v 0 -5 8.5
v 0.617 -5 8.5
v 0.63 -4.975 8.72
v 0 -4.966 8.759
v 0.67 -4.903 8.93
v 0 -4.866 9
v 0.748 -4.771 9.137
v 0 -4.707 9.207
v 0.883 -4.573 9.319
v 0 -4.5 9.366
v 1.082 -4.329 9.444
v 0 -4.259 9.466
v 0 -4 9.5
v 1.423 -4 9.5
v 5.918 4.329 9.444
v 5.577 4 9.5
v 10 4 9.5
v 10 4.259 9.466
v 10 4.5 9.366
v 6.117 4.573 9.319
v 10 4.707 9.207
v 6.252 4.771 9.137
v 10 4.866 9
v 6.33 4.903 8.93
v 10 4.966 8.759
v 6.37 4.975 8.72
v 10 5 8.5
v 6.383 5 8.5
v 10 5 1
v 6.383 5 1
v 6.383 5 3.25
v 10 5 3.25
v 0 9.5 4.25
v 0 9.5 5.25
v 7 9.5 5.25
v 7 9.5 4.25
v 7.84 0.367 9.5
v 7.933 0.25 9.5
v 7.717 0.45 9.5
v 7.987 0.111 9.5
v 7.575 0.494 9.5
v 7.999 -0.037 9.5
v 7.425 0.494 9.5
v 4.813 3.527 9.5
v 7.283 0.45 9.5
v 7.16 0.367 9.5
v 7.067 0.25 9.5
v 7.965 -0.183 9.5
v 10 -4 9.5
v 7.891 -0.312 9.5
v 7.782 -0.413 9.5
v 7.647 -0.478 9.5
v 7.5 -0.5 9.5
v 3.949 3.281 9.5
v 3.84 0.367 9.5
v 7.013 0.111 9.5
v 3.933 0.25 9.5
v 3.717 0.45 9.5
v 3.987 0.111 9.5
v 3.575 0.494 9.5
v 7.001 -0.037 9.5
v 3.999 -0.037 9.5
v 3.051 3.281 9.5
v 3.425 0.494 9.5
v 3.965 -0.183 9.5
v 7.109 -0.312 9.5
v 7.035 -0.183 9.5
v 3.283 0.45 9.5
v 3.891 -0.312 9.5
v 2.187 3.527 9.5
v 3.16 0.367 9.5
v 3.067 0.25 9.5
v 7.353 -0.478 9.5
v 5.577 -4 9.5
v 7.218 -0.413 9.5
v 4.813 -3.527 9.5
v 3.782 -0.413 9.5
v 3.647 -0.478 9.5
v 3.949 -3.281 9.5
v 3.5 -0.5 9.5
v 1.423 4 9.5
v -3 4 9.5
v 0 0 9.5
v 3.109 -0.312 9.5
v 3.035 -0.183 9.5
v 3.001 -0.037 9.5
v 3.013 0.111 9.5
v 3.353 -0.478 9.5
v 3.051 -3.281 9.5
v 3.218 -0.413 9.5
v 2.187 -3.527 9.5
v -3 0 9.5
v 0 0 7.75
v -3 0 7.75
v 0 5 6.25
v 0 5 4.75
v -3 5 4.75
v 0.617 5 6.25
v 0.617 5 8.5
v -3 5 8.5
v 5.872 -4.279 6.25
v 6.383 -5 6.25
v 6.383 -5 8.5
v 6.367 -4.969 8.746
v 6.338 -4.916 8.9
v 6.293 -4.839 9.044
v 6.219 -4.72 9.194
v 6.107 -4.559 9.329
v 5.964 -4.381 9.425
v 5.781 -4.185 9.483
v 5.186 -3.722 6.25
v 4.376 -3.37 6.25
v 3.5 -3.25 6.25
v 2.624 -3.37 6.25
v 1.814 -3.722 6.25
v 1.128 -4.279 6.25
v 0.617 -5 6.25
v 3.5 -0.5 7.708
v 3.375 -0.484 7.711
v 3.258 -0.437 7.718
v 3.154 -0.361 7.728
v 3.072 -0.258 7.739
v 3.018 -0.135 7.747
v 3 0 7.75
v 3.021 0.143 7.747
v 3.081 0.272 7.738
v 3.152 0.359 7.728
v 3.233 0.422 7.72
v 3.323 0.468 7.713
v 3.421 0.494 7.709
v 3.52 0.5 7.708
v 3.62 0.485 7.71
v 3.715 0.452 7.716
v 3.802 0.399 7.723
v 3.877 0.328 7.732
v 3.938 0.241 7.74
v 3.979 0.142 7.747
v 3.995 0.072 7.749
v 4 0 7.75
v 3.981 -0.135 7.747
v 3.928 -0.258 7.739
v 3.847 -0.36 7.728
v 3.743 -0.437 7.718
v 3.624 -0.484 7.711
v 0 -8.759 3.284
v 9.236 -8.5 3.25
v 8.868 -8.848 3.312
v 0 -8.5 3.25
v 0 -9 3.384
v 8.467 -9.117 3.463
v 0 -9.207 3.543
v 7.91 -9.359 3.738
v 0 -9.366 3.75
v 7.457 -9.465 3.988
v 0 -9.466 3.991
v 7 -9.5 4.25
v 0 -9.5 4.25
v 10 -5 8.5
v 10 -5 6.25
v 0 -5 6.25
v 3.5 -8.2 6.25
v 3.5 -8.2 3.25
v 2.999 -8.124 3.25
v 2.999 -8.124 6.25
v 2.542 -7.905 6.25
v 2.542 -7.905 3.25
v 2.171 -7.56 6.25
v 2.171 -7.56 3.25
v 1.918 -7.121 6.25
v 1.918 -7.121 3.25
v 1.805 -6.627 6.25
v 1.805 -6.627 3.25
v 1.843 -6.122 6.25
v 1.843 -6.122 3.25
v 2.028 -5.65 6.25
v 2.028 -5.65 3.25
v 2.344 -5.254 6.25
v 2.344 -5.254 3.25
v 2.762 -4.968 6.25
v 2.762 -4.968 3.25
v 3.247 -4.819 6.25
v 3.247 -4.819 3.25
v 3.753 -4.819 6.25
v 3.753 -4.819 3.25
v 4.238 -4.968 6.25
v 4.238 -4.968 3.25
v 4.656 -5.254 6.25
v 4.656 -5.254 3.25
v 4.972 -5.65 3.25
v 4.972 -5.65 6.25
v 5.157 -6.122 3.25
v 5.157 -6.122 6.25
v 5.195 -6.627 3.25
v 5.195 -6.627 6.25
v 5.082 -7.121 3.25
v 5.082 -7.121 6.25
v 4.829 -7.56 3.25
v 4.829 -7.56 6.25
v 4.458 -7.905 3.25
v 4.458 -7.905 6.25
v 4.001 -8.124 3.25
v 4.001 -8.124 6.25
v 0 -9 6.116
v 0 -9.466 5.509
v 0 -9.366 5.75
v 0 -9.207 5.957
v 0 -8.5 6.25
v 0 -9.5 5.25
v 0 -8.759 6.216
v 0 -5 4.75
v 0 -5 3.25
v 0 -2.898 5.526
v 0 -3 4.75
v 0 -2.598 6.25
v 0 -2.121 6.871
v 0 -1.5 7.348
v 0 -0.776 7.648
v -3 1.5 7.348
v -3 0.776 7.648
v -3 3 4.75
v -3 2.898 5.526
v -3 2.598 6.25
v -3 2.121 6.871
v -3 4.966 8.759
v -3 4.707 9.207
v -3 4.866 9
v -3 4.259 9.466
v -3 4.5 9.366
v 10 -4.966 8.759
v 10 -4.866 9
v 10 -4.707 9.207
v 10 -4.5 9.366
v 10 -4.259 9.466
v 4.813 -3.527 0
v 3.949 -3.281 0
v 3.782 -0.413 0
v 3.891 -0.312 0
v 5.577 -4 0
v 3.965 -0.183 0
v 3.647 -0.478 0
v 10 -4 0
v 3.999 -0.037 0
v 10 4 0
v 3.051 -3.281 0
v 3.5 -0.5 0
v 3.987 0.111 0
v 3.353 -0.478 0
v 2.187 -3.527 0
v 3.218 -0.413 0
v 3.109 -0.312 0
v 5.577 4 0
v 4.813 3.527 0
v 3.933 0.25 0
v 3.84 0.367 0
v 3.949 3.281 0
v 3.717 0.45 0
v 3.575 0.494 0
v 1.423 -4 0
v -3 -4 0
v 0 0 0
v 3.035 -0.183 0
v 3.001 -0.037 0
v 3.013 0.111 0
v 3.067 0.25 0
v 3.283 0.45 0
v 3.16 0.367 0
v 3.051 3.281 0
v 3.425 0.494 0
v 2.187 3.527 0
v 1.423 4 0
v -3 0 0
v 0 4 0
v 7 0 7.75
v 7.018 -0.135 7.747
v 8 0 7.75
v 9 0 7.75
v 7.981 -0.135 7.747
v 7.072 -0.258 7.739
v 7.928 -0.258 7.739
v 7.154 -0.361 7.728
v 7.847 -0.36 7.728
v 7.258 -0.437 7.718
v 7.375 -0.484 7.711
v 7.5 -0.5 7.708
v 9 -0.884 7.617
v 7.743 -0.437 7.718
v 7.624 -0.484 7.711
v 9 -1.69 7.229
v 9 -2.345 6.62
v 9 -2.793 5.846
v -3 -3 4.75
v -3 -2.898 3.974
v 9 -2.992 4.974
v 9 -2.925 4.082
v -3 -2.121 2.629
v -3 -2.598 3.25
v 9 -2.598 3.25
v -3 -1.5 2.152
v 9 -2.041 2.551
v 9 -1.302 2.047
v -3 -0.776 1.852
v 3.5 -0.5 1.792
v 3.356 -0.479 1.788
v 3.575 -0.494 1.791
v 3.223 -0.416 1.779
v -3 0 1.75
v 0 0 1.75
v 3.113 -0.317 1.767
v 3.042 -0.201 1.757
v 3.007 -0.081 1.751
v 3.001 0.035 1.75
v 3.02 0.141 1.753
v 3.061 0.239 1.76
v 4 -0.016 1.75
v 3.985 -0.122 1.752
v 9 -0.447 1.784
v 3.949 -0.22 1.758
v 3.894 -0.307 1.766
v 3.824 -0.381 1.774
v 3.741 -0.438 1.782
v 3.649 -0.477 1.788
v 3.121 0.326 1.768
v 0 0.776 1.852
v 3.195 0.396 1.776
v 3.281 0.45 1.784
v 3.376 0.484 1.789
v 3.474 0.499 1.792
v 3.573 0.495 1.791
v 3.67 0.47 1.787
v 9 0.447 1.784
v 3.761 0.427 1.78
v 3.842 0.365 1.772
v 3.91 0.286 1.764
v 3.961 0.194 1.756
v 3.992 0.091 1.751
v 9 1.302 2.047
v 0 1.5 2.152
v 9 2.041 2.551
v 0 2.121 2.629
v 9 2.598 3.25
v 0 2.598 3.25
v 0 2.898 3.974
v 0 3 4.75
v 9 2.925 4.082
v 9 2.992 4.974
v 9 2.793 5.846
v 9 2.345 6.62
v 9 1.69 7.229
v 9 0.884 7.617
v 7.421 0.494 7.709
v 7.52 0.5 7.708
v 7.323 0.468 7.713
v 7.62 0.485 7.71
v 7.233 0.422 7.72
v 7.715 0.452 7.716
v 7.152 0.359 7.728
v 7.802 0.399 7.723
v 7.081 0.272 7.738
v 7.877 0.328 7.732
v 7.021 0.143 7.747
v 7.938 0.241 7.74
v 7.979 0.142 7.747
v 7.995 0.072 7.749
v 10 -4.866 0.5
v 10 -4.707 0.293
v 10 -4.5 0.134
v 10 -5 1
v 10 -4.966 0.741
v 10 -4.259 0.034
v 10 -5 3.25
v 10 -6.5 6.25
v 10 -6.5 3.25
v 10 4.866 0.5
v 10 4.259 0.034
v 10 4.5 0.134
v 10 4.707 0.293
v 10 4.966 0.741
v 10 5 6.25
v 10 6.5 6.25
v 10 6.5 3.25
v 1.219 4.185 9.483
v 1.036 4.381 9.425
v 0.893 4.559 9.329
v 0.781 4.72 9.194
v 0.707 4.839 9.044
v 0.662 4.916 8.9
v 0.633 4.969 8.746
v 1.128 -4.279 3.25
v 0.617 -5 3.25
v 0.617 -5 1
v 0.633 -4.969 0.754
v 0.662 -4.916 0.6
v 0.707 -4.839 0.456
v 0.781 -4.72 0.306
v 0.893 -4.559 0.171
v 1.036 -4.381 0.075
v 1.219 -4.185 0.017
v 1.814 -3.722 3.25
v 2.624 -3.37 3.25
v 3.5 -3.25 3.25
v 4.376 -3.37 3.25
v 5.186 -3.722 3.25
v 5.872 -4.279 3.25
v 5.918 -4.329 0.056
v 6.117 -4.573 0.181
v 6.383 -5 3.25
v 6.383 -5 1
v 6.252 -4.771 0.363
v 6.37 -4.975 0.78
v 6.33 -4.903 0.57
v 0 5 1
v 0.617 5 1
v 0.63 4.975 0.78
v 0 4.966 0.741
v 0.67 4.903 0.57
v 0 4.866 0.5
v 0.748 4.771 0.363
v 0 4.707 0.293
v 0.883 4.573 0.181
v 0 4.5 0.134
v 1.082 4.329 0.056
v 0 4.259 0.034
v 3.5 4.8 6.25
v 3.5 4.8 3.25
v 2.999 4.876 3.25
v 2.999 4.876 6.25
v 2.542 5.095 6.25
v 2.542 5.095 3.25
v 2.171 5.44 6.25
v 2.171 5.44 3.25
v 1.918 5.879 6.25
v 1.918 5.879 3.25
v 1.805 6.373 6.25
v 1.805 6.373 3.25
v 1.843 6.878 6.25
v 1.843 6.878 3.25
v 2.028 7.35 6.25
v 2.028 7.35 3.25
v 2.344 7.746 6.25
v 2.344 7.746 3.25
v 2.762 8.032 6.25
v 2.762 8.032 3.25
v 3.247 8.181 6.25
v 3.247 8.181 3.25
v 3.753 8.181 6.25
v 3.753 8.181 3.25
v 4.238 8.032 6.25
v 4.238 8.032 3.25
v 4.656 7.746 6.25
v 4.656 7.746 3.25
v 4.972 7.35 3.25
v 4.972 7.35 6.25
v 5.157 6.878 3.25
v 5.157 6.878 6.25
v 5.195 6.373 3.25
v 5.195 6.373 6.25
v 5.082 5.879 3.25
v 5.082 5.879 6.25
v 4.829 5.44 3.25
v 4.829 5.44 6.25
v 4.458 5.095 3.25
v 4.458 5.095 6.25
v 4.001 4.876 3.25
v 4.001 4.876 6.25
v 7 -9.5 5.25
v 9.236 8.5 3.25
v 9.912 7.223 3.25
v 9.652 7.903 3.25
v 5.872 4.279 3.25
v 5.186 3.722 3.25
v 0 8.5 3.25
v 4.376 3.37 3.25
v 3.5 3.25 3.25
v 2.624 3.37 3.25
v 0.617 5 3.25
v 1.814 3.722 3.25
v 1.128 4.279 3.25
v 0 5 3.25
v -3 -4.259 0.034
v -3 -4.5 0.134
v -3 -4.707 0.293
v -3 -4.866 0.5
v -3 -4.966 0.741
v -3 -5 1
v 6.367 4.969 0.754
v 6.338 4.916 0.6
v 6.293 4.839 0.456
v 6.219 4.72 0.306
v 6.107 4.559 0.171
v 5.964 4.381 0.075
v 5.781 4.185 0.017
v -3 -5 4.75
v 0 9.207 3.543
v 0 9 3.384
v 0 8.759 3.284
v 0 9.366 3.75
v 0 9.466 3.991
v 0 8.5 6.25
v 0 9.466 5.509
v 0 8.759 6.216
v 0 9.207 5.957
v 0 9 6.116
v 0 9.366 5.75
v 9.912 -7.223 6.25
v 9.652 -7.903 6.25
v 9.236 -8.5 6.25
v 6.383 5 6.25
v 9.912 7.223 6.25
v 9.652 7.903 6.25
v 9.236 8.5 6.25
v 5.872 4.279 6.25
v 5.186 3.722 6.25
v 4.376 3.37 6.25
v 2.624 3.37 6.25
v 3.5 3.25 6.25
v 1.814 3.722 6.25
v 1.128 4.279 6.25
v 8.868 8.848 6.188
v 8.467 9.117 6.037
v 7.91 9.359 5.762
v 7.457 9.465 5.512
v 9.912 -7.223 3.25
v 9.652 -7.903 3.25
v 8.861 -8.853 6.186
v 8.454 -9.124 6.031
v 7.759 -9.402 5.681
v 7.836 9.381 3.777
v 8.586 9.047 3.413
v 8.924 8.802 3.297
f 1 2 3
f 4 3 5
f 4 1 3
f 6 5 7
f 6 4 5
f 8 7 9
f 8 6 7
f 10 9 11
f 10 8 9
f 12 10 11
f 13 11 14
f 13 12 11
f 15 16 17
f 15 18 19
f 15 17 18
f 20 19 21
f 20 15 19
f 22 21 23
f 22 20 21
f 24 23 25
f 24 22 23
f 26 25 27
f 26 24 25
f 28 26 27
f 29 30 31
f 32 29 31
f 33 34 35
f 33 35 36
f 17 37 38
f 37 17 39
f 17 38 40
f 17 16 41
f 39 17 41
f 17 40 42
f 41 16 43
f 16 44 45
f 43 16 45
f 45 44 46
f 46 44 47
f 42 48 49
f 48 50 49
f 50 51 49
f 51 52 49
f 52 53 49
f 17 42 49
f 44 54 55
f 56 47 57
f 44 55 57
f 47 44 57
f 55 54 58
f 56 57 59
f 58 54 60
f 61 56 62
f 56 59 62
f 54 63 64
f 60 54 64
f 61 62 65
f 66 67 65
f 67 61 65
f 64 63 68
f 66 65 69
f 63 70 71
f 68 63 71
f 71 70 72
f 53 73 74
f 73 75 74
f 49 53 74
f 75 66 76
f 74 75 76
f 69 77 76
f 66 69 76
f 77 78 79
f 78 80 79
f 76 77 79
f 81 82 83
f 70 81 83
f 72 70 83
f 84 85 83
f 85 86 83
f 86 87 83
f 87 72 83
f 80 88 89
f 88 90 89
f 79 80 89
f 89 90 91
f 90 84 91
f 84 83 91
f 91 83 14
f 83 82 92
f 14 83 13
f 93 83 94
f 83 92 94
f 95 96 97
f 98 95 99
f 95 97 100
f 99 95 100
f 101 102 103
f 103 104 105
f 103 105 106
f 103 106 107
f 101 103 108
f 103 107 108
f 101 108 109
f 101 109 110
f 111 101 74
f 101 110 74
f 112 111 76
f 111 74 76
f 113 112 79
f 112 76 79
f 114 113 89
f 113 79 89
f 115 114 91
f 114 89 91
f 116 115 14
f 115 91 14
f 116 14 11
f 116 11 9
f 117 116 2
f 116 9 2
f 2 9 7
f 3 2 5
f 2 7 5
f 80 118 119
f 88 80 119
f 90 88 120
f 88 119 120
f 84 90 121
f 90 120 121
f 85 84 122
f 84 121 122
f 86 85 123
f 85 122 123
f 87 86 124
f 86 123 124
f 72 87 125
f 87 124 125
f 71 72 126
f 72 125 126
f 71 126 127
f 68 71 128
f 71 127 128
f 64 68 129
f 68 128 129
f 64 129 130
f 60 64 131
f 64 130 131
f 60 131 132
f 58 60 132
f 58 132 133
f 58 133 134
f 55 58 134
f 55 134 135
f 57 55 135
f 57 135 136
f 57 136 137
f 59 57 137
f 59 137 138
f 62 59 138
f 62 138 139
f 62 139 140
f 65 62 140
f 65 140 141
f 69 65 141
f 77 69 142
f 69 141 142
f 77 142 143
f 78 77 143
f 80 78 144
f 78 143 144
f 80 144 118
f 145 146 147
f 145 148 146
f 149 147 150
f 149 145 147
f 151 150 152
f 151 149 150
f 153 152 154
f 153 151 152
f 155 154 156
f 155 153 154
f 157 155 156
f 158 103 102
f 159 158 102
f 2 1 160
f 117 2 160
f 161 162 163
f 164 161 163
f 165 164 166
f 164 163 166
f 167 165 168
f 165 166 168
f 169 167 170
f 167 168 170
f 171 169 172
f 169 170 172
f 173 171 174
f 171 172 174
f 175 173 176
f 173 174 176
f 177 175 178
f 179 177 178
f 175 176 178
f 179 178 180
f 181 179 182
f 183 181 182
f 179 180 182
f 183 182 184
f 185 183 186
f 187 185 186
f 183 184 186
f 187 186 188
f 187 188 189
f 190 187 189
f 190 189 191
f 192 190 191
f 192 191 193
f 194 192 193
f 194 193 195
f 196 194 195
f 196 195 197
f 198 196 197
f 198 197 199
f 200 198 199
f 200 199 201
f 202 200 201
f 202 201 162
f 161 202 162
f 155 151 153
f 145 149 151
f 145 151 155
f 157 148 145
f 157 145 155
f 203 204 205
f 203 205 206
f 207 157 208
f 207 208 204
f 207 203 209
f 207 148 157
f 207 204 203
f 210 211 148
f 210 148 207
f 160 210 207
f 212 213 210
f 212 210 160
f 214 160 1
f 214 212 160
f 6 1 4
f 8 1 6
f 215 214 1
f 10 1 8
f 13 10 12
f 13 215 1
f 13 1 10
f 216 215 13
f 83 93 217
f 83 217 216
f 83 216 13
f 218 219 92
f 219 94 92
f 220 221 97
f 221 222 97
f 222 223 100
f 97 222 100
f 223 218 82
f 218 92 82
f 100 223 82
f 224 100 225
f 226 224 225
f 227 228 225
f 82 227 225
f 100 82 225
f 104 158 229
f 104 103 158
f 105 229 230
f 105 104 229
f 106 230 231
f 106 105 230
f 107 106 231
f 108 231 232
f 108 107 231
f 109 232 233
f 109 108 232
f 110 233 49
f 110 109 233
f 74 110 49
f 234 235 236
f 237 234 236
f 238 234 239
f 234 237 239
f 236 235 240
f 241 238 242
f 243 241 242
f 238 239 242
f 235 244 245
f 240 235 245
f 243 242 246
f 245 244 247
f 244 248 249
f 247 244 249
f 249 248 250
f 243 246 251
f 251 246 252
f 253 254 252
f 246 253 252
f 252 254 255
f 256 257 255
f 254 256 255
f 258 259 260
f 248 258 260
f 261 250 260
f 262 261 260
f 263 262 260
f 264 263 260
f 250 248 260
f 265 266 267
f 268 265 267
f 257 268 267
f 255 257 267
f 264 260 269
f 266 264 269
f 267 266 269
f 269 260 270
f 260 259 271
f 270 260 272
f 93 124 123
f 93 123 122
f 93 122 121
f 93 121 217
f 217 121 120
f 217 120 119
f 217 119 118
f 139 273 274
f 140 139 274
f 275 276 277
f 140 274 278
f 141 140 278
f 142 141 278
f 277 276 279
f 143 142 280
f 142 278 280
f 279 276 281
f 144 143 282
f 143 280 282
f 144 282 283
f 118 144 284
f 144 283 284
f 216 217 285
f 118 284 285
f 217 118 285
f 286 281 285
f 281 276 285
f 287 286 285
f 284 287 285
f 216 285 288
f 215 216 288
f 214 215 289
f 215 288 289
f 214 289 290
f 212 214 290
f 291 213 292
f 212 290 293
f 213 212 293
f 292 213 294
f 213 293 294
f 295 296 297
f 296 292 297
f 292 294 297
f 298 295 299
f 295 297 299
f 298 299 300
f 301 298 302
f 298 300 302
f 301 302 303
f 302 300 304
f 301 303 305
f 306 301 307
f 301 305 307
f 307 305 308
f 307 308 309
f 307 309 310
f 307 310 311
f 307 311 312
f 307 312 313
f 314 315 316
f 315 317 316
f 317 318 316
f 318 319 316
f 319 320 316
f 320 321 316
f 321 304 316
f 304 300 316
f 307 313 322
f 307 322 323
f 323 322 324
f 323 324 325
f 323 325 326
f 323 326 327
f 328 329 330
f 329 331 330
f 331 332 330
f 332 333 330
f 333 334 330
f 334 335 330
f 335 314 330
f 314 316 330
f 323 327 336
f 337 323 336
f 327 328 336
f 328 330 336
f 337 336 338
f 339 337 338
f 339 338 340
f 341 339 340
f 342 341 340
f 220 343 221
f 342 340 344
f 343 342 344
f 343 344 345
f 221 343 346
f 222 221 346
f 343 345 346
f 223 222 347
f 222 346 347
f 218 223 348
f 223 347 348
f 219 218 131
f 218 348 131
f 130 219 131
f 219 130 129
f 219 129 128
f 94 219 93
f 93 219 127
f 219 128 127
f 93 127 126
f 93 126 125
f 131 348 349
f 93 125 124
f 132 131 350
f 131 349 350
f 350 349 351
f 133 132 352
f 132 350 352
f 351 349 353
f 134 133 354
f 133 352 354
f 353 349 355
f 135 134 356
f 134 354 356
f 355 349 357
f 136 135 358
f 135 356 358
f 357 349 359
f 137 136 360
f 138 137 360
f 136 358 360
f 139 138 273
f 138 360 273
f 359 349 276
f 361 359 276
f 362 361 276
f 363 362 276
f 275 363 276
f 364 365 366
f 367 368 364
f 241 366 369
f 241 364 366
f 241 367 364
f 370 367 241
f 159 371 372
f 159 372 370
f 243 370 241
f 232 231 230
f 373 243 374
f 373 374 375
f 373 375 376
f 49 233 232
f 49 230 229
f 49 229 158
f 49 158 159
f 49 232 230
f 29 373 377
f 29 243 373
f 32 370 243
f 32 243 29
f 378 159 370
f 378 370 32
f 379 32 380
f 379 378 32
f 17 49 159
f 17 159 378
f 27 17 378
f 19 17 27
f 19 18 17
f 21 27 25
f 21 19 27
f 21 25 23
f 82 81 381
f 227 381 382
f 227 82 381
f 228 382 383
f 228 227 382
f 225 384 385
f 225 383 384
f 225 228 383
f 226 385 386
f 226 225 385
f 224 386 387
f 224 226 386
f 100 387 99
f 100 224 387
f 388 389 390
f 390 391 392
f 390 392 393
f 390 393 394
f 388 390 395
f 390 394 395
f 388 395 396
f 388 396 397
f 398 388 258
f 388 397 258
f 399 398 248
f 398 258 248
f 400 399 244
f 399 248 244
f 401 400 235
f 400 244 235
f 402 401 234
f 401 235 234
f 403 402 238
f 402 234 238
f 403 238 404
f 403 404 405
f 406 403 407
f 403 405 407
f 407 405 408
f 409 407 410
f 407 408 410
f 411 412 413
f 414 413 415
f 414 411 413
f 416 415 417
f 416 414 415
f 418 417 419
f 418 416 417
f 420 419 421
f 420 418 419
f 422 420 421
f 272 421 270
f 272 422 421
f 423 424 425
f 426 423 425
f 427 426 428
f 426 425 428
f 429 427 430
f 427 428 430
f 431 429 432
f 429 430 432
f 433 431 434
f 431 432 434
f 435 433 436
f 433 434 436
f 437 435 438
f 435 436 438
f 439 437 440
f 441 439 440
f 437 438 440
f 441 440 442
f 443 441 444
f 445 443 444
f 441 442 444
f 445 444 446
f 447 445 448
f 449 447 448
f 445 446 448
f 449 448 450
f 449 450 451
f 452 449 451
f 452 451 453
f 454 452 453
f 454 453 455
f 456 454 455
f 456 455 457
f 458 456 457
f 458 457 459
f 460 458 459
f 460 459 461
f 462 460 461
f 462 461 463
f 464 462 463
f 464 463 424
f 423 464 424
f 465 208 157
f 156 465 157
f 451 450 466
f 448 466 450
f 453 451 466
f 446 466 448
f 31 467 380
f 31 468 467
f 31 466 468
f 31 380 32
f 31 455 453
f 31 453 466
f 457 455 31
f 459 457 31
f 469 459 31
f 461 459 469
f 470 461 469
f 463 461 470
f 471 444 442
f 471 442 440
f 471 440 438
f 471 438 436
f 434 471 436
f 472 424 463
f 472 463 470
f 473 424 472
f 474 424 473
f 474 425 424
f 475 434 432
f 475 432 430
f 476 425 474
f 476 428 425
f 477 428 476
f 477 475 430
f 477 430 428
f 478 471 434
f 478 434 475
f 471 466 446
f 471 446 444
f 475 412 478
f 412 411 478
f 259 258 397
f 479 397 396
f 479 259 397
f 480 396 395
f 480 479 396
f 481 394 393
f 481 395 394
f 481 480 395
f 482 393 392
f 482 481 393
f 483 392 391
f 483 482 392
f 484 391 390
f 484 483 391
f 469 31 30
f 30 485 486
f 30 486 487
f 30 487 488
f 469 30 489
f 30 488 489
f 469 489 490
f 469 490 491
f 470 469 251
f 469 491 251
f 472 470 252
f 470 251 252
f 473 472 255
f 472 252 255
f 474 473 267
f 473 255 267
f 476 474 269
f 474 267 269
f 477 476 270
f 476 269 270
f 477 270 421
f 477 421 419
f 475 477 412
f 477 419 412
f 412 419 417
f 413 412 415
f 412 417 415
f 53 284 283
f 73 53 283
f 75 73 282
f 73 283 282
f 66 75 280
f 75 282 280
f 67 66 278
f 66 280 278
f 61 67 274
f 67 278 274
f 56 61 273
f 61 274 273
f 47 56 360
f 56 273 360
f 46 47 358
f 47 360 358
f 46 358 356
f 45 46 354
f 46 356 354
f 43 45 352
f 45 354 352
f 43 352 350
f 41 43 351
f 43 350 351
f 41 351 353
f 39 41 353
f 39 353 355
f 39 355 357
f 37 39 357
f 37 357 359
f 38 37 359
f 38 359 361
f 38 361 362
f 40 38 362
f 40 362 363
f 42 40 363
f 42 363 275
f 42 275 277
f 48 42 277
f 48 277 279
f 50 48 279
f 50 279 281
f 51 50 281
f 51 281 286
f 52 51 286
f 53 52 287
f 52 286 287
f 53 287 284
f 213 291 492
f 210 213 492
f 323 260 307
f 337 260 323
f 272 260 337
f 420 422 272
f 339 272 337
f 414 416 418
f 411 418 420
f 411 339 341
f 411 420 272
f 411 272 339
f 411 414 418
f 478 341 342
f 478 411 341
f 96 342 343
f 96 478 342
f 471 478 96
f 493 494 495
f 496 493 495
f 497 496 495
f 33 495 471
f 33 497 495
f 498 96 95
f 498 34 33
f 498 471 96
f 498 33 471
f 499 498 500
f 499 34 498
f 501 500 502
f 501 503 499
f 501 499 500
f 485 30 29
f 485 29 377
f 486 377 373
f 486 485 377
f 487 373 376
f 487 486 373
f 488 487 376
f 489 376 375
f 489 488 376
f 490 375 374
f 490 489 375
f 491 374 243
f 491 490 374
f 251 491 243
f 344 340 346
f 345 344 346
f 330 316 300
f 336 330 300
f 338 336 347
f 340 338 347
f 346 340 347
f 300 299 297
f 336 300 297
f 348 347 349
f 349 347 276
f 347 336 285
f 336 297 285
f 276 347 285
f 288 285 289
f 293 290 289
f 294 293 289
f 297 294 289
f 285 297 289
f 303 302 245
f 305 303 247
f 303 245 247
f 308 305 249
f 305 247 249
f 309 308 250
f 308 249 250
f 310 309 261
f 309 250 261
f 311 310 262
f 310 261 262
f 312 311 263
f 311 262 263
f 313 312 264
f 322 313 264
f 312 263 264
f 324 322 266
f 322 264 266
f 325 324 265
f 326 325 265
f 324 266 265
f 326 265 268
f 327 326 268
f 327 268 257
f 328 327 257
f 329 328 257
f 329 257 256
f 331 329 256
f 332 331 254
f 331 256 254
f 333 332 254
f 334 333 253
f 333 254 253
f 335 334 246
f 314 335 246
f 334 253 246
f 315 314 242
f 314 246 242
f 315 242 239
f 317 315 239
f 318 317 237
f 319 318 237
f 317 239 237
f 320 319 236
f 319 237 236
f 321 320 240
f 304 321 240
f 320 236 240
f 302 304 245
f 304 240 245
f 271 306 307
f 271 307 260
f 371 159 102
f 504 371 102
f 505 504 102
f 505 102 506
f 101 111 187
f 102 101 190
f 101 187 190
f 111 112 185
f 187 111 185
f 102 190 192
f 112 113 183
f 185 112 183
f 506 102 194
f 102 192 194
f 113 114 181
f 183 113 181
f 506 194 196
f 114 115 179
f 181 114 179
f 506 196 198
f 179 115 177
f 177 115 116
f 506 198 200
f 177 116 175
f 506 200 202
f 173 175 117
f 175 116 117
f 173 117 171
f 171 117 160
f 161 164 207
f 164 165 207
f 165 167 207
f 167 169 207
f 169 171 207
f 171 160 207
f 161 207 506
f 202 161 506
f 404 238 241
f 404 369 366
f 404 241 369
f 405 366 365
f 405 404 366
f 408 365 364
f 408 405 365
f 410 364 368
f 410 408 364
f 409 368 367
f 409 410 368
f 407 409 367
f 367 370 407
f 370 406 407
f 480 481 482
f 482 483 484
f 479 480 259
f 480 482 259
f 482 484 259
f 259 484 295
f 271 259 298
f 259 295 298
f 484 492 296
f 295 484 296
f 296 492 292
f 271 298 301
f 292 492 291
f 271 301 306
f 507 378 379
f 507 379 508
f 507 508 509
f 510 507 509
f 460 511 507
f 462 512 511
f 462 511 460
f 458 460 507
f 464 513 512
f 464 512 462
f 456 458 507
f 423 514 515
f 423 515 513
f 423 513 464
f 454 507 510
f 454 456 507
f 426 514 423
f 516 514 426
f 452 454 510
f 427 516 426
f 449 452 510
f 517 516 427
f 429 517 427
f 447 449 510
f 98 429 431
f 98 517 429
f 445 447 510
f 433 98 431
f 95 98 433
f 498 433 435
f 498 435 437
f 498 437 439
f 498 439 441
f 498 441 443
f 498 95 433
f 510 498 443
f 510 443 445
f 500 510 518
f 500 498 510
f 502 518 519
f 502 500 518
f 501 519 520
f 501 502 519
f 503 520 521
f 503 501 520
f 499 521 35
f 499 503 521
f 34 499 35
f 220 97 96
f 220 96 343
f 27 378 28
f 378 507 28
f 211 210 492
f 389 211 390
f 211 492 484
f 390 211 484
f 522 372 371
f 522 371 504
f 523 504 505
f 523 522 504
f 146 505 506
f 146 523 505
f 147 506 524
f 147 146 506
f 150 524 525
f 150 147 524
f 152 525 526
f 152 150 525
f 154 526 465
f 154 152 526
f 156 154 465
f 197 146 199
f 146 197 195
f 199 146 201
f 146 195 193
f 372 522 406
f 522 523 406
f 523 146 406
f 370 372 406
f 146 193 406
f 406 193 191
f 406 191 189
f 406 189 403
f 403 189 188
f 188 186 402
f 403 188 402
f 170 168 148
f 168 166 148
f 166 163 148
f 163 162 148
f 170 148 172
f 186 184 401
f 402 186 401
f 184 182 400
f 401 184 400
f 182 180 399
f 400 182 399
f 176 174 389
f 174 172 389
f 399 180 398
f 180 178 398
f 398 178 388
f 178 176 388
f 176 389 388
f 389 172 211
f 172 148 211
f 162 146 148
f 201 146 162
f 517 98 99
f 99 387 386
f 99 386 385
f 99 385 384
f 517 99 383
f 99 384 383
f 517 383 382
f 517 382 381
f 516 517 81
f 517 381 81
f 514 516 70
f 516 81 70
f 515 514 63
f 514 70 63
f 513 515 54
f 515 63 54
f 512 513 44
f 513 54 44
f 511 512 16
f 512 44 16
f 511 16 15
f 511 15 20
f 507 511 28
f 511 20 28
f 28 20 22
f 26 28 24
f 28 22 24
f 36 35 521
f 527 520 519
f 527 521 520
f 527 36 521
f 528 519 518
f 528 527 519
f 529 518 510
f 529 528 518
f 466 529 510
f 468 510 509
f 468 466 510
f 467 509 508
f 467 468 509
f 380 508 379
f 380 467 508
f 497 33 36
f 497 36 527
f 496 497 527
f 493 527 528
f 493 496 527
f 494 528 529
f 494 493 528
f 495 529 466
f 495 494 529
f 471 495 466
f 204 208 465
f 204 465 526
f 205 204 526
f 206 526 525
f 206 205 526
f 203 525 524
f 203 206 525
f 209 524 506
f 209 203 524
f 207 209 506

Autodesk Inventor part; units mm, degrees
ref_plane "YZ Plane" through (0, 0, 0) normal (1, 0, 0) x (0, 1, 0)
ref_plane "XZ Plane" through (0, 0, 0) normal (0, 1, 0) x (-1, 0, 0)
ref_plane "XY Plane" through (0, 0, 0) normal (0, 0, 1) x (1, 0, 0)
sketch "Skizze3" plane through (0, 0, 0) normal (1, 0, 0) x (0, 1, 0)
  line L0 (4, 9.5) -> (-4, 9.5)
  line L1 (-5, 8.5) -> (-5, 1)
  line L2 (-4, 0) -> (4, 0)
  line L3 (5, 1) -> (5, 8.5)
  arc A0 (5, 8.5) -> (4, 9.5) centre (4, 8.5) ccw
  arc A1 (-4, 9.5) -> (-5, 8.5) centre (-4, 8.5) ccw
  arc A2 (-5, 1) -> (-4, 0) centre (-4, 1) ccw
  arc A3 (4, 0) -> (5, 1) centre (4, 1) ccw
  line L4 (-5, 6.25) -> (-9.5, 6.25)
  line L5 (-9.5, 6.25) -> (-9.5, 3.25)
  line L6 (-9.5, 3.25) -> (-5, 3.25)
  line L7 (5, 6.25) -> (9.5, 6.25)
  line L8 (9.5, 6.25) -> (9.5, 3.25)
  line L9 (9.5, 3.25) -> (5, 3.25)
  point P0 (-5, 0)
  point P1 (-5, 9.5)
  point P2 (5, 0)
  point P3 (0, 0)
  point P4 (0, 0)
  point P5 (-9.5, 4.75)
  point P6 (-5, 4.75)
  point P7 (9.5, 4.75)
  point P8 (5, 4.75)
  dimension "d12" = 10
  dimension "d13" = 9.5
  dimension "d14" = 1
  dimension "d83" = 4.5
  dimension "d84" = 3
extrude "Extrusion3" add sketch "Skizze3" along normal blind 10 and the other way blind 3 contours A0 L3 A3 L2 A2 L1 A1 L0
extrude "Extrusion4" add sketch "Skizze3" along normal blind 10 and the other way blind 3 contours L7 L8 L9 L3 | L1 L6 L5 L4
fillet "Rundung1" radius 3 4 edges at (-3, -9.5, 4.75) (10, -9.5, 4.75) (10, 9.5, 4.75) (-3, 9.5, 4.75)
sketch "Skizze5" plane through (-3, 0, 0) normal (-1, 0, 0) x (0, 0, 1)
  line L0 (1, -5) -> (8.5, -5) projected
  line L1 (9.5, -4) -> (9.5, 4) projected
  point P0 (0, 0)
  point P1 (4.75, 0)
  point P2 (4.75, -5)
  point P3 (9.5, 0)
hole "Bohrung3" at (-3, 0, 4.75) direction (1, 0, 0) diameter 6 depth 12
sketch "Skizze6" plane through (-3, -4, 9.5) normal (0, 0, 1) x (1, 0, 0)
  line L0 (0, 0) -> (0, 8) projected
  point P0 (3, 4)
  point P1 (3, 4)
  point P2 (0, 8)
  point P3 (0, 4)
  point P4 (0, 4)
  dimension "d41" = 3
sketch "Skizze7" plane through (-3, -4, 9.5) normal (0, 0, 1) x (1, 0, 0)
  line L0 (13, 8) -> (13, 0) projected
  line L1 (0, 0) -> (0, 8) projected
  line L2 (12, 7) -> (12, 1) projected
  point P0 (6.5, 4)
  point P1 (13, 4)
  dimension "d122" = 5.5
hole "Bohrung5" at (3.5, 0, 9.5) direction (0, 0, -1) diameter 1 end through all
sketch "Skizze9" plane through (0, -5, 6.25) normal (0, 0, 1) x (1, 0, 0)
  arc A0 (-3, -1.5) -> (0, -4.5) centre (0, -1.5) ccw projected
  line L0 (-3, 0) -> (10, 0) projected
  arc A1 (0, 14.5) -> (-3, 11.5) centre (0, 11.5) ccw projected
  line L1 (10, 10) -> (-3, 10) projected
  line L2 (-3, 10) -> (-3, 11.5) projected
  line L3 (10, 11.5) -> (10, 10) projected
  line L4 (10, 0) -> (10, -1.5) projected
  line L5 (-3, -1.5) -> (-3, 0) projected
  arc A2 (10, 11.5) -> (7, 14.5) centre (7, 11.5) ccw projected
  line L6 (7, 14.5) -> (0, 14.5) projected
  line L7 (0, -4.5) -> (7, -4.5) projected
  arc A3 (7, -4.5) -> (10, -1.5) centre (7, -1.5) ccw projected
  point P0 (0, 5)
  point P1 (3.5, -1.5)
  point P2 (3.5, 11.5)
  point P3 (3.5, 14.5)
  point P4 (3.5, -4.5)
hole "Bohrung6" at (3.5, 6.5, 6.25) at (3.5, -6.5, 6.25) direction (0, 0, -1) diameter 3.4 end through all clearance for "Inbusschraube DIN EN ISO 4762" size "M3" standard "DIN"
hole "Bohrung7" at (3.5, -6.5, 6.25) at (3.5, 6.5, 6.25) direction (0, 0, 1) diameter 3.4 end through all counterbore diameter 6.5 counterbore depth 3.4 clearance for "Inbusschraube DIN EN ISO 4762" size "M3" standard "DIN"
sketch "Skizze10" plane through (10, -5, 3.25) normal (0, 0, -1) x (-1, 0, 0)
  arc A0 (5.7, 0) -> (7.3, 0) centre (6.5, -1.5) ccw projected
  arc A1 (7.3, 10) -> (5.7, 10) centre (6.5, 11.5) ccw projected
  point P0 (10, 5)
hole "Bohrung8" at (3.5, -6.5, 3.25) at (3.5, 6.5, 3.25) direction (0, 0, -1) diameter 3.4 end through all counterbore diameter 6.5 counterbore depth 3.4 clearance for "Inbusschraube DIN EN ISO 4762" size "M3" standard "DIN"
sketch "Skizze11" plane through (-3, 0, 0) normal (-1, 0, 0) x (0, 0, 1)
  circle A0 centre (4.75, 0) radius 3 projected
  line L0 (3.25, 6.5) -> (6.25, 6.5) projected
  line L1 (3.25, 6.5) -> (3.25, 5) projected
  line L2 (3.25, 5) -> (1, 5) projected
  arc A1 (1, 5) -> (0, 4) centre (1, 4) ccw projected
  line L3 (0, 4) -> (0, -4) projected
  arc A2 (0, -4) -> (1, -5) centre (1, -4) ccw projected
  line L4 (1, -5) -> (3.25, -5) projected
  line L5 (3.25, -5) -> (3.25, -6.5) projected
  line L6 (6.25, -6.5) -> (3.25, -6.5) projected
  line L7 (6.25, -6.5) -> (6.25, -5) projected
  line L8 (6.25, -5) -> (8.5, -5) projected
  arc A3 (8.5, -5) -> (9.5, -4) centre (8.5, -4) ccw projected
  line L9 (9.5, -4) -> (9.5, 4) projected
  arc A4 (9.5, 4) -> (8.5, 5) centre (8.5, 4) ccw projected
  line L10 (8.5, 5) -> (6.25, 5) projected
  line L11 (6.25, 5) -> (6.25, 6.5) projected
  line L12 (6.25, 5) -> (3.25, 5)
  line L13 (0.4, 4.8) -> (9.1, 4.8) projected
  line L14 (6.25, -3.25) -> (6.25, -5) projected
  line L15 (6.25, -5) -> (3.25, -5)
  line L16 (0.4, -4.8) -> (9.1, -4.8) projected
  line L17 (9.5, -4) -> (9.5, 4) projected
  line L18 (9.5, 0) -> (0, 0)
  line L19 (3.25, 9.5) -> (3.25, 6.5) projected
  line L20 (3.25, 6.5) -> (6.25, 6.5) projected
  line L21 (6.25, 6.5) -> (6.25, 9.5) projected
  line L22 (6.25, 9.5) -> (3.25, 9.5) projected
  line L23 (6.25, -9.5) -> (6.25, -6.5) projected
  line L24 (6.25, -6.5) -> (3.25, -6.5) projected
  line L25 (3.25, -6.5) -> (3.25, -9.5) projected
  line L26 (3.25, -9.5) -> (6.25, -9.5) projected
  line L27 (4.75, 5) -> (4.75, -5)
  point P0 (9.1757, 4.7372)
  point P1 (0.3243, -4.7372)
  point P2 (1.75, 0)
  point P3 (7.75, 0)
  point P4 (4.75, 3)
  point P5 (4.75, -3)
extrude "Extrusion7" cut sketch "Skizze11" against normal blind 3 contours L18 L27 A0 | L18 L9 A3 L16 L27 A0 | A0 L27 L18 | L27 L18 A0 | A0 L18 L3 A1 L13 L27 | A0 L18 L27 | L13 A1 L2 L12 L27 | L16 L14 L15 L27 | L12 L1 L0 L11 | L16 A3 L8 L14 | L15 L7 L6 L5 | L0 L19 L22 L21 | L23 L26 L25 L6
sketch "Skizze12" plane through (-3, 4, 9.5) normal (0, 0, 1) x (1, 0, 0)
  line L0 (12, -1) -> (12, -7) projected
  point P0 (3, -4)
  point P1 (10.5, -4)
  point P2 (12, -4)
  dimension "d113" = 1.5
hole "Bohrung9" at (7.5, 0, 9.5) direction (0, 0, -1) diameter 1 depth 3.25
sketch "Skizze13" plane through (0, 0, 0) normal (-1, 0, 0) x (0, 0, 1)
  line L0 (3.25, 9.5) -> (6.25, 9.5) projected
  line L1 (5.25, 9.5) -> (4.25, 9.5)
  line L2 (3.25, 8.5) -> (3.25, 5)
  line L3 (6.25, 8.5) -> (6.25, 5)
  line L4 (6.25, -5) -> (6.25, -8.5)
  line L5 (3.25, -9.5) -> (6.25, -9.5) projected
  line L6 (5.25, -9.5) -> (4.25, -9.5)
  line L7 (3.25, -8.5) -> (3.25, -5)
  line L8 (3.25, -8.2) -> (3.25, -4.8) projected
  arc A0 (6.25, 8.5) -> (5.25, 9.5) centre (5.25, 8.5) ccw
  arc A1 (4.25, 9.5) -> (3.25, 8.5) centre (4.25, 8.5) ccw
  arc A2 (3.25, -8.5) -> (4.25, -9.5) centre (4.25, -8.5) ccw
  arc A3 (5.25, -9.5) -> (6.25, -8.5) centre (5.25, -8.5) ccw
  line L9 (6.25, 9.5) -> (6.25, 5) projected
  line L10 (3.25, 5) -> (3.25, 9.5) projected
  line L11 (6.25, -5) -> (6.25, -9.5) projected
  line L12 (3.25, -9.5) -> (3.25, -5) projected
  point P0 (0, 0)
  point P1 (5.25, 9.5)
  point P2 (4.25, 9.5)
  dimension "d123" = 1
extrude "Extrusion8" cut sketch "Skizze13" against normal through all
properties part number "BT015_huenin20_23" material "E360"
